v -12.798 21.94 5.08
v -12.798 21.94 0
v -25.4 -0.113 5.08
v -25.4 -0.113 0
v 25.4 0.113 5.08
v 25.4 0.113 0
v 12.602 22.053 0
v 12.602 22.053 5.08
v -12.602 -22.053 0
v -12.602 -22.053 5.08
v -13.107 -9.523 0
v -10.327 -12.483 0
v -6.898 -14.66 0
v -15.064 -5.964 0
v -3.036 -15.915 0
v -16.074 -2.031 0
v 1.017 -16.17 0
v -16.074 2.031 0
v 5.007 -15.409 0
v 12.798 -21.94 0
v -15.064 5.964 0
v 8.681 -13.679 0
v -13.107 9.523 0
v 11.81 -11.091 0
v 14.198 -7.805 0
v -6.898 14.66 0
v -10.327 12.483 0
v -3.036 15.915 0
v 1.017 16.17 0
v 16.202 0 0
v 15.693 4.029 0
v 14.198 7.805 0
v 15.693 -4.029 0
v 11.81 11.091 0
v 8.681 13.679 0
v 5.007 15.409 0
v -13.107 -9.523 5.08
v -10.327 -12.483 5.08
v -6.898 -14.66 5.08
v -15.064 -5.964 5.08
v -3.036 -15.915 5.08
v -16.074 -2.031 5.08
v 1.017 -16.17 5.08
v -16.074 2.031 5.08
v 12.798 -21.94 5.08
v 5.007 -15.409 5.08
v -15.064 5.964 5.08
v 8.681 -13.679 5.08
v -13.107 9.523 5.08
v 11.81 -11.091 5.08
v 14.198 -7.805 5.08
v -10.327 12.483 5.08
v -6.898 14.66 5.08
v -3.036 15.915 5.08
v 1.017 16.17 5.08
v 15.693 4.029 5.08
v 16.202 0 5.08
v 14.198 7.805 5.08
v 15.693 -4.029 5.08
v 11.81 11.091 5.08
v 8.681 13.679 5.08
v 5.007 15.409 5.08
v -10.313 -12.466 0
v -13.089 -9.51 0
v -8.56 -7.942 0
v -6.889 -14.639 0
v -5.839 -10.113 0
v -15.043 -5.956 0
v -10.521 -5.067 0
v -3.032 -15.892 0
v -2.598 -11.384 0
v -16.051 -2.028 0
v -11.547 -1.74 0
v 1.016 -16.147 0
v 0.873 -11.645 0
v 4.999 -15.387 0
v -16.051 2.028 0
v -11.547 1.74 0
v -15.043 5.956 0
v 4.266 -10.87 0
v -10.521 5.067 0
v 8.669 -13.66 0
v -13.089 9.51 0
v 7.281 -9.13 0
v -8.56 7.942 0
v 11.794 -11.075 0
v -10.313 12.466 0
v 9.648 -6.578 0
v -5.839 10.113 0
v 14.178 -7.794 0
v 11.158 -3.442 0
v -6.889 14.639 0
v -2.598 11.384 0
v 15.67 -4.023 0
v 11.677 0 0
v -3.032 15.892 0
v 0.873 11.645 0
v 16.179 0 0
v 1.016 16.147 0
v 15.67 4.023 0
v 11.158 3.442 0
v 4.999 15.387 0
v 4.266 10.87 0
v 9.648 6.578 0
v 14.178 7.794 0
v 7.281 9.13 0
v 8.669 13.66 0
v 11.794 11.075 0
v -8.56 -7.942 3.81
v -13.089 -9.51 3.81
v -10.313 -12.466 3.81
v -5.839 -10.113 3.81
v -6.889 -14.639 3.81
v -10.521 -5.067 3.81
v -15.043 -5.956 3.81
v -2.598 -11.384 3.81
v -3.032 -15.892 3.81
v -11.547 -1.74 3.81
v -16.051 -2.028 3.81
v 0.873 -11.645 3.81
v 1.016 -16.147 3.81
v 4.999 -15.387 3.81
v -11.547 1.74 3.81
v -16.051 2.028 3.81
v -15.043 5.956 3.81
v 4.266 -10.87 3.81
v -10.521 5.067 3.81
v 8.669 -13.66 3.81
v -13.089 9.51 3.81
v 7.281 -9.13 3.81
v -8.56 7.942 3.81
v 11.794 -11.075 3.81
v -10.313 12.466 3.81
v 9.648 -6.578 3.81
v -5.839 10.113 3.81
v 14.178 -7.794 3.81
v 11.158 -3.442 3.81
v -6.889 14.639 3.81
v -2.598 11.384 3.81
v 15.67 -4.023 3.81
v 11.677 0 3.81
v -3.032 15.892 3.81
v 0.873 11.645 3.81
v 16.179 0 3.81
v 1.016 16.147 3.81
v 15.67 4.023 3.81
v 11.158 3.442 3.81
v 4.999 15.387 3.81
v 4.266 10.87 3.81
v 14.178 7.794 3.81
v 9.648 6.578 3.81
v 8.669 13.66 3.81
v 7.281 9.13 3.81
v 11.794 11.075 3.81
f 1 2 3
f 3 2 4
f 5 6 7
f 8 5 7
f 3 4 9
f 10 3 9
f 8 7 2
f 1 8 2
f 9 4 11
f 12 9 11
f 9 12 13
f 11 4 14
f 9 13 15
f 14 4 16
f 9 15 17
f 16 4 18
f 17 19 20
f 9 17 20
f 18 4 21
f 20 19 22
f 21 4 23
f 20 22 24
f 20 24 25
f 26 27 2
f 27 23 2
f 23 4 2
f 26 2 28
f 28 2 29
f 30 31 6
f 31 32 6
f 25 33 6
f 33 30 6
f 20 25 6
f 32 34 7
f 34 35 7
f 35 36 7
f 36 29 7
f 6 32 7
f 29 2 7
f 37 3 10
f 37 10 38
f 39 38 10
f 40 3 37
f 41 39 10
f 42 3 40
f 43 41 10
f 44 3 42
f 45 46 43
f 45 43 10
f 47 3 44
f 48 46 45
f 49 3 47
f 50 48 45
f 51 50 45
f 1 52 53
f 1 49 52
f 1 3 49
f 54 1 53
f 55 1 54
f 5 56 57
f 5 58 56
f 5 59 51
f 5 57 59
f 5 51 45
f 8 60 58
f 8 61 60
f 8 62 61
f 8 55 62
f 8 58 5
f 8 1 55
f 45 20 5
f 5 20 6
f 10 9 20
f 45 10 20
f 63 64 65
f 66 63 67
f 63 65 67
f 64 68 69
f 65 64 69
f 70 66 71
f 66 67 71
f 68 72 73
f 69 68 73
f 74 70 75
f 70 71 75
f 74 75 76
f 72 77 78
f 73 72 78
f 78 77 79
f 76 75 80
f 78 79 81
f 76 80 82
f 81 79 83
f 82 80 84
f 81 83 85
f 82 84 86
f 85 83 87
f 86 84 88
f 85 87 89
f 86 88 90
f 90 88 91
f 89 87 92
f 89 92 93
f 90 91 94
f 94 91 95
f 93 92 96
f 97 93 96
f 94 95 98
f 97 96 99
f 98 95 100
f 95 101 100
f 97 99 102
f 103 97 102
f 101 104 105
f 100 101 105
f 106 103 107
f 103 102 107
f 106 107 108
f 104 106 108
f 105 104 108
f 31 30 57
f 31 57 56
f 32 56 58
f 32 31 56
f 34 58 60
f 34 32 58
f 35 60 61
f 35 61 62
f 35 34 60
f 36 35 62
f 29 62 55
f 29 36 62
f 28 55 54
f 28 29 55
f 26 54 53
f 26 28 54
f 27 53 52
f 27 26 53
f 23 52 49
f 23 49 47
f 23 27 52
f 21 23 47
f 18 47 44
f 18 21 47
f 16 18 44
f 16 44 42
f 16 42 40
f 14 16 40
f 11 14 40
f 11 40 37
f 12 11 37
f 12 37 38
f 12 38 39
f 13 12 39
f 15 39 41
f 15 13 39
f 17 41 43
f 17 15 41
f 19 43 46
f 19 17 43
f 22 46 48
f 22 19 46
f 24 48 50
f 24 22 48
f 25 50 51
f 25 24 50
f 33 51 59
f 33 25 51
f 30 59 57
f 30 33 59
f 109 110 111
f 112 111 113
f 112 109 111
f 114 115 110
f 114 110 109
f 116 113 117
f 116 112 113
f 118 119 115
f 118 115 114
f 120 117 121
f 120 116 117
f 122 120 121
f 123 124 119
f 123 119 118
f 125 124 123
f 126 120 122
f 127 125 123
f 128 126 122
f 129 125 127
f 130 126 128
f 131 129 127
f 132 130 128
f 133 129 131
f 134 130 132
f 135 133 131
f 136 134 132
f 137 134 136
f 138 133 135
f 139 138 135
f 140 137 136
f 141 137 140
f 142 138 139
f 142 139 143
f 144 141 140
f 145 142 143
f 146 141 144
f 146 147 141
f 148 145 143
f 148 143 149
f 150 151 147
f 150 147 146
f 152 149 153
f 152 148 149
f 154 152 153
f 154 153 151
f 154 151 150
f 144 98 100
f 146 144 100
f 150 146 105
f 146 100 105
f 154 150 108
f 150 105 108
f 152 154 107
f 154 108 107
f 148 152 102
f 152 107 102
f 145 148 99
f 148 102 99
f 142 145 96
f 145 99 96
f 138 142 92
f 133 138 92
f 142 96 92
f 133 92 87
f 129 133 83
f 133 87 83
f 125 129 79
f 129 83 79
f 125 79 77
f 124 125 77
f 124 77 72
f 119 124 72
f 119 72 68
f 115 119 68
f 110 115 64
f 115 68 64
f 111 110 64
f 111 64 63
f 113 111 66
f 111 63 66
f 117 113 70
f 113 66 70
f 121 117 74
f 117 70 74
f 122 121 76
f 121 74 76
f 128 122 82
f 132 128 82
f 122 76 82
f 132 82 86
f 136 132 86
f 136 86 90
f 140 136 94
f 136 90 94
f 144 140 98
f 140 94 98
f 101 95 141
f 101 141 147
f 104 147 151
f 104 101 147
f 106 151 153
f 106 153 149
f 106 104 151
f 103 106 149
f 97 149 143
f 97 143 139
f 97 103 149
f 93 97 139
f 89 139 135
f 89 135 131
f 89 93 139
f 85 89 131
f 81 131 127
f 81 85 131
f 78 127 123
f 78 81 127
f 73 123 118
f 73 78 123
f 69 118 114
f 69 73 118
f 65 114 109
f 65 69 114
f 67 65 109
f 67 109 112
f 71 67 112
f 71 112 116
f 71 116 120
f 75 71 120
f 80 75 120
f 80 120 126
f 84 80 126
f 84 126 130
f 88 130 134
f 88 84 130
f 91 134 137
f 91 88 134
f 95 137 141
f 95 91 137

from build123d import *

# Parameters (mm, degrees)
F0_R     = 16.201527
F1_DEPTH = 5.08
F0_R_2   = 16.178711
F0_R_3   = 11.677175
F2_DEPTH = 3.81


with BuildPart() as f1:
    # F0 (on Top) → F1 (new body)
    with BuildSketch(Plane.XY):
        Polygon((12.601996, 22.053338), (-12.797753, 21.940317), (-25.399749, -0.11302), (-12.601996, -22.053338), (12.797753, -21.940317), (25.399749, 0.11302), align=None)
        Circle(F0_R, mode=Mode.SUBTRACT)
    extrude(amount=F1_DEPTH)


with BuildPart() as f2:
    # F0 (on Top) → F2 (new body)
    with BuildSketch(Plane.XY):
        Circle(F0_R_2)
        Circle(F0_R_3, mode=Mode.SUBTRACT)
    extrude(amount=F2_DEPTH)


solid = Compound([f1.part, f2.part])
